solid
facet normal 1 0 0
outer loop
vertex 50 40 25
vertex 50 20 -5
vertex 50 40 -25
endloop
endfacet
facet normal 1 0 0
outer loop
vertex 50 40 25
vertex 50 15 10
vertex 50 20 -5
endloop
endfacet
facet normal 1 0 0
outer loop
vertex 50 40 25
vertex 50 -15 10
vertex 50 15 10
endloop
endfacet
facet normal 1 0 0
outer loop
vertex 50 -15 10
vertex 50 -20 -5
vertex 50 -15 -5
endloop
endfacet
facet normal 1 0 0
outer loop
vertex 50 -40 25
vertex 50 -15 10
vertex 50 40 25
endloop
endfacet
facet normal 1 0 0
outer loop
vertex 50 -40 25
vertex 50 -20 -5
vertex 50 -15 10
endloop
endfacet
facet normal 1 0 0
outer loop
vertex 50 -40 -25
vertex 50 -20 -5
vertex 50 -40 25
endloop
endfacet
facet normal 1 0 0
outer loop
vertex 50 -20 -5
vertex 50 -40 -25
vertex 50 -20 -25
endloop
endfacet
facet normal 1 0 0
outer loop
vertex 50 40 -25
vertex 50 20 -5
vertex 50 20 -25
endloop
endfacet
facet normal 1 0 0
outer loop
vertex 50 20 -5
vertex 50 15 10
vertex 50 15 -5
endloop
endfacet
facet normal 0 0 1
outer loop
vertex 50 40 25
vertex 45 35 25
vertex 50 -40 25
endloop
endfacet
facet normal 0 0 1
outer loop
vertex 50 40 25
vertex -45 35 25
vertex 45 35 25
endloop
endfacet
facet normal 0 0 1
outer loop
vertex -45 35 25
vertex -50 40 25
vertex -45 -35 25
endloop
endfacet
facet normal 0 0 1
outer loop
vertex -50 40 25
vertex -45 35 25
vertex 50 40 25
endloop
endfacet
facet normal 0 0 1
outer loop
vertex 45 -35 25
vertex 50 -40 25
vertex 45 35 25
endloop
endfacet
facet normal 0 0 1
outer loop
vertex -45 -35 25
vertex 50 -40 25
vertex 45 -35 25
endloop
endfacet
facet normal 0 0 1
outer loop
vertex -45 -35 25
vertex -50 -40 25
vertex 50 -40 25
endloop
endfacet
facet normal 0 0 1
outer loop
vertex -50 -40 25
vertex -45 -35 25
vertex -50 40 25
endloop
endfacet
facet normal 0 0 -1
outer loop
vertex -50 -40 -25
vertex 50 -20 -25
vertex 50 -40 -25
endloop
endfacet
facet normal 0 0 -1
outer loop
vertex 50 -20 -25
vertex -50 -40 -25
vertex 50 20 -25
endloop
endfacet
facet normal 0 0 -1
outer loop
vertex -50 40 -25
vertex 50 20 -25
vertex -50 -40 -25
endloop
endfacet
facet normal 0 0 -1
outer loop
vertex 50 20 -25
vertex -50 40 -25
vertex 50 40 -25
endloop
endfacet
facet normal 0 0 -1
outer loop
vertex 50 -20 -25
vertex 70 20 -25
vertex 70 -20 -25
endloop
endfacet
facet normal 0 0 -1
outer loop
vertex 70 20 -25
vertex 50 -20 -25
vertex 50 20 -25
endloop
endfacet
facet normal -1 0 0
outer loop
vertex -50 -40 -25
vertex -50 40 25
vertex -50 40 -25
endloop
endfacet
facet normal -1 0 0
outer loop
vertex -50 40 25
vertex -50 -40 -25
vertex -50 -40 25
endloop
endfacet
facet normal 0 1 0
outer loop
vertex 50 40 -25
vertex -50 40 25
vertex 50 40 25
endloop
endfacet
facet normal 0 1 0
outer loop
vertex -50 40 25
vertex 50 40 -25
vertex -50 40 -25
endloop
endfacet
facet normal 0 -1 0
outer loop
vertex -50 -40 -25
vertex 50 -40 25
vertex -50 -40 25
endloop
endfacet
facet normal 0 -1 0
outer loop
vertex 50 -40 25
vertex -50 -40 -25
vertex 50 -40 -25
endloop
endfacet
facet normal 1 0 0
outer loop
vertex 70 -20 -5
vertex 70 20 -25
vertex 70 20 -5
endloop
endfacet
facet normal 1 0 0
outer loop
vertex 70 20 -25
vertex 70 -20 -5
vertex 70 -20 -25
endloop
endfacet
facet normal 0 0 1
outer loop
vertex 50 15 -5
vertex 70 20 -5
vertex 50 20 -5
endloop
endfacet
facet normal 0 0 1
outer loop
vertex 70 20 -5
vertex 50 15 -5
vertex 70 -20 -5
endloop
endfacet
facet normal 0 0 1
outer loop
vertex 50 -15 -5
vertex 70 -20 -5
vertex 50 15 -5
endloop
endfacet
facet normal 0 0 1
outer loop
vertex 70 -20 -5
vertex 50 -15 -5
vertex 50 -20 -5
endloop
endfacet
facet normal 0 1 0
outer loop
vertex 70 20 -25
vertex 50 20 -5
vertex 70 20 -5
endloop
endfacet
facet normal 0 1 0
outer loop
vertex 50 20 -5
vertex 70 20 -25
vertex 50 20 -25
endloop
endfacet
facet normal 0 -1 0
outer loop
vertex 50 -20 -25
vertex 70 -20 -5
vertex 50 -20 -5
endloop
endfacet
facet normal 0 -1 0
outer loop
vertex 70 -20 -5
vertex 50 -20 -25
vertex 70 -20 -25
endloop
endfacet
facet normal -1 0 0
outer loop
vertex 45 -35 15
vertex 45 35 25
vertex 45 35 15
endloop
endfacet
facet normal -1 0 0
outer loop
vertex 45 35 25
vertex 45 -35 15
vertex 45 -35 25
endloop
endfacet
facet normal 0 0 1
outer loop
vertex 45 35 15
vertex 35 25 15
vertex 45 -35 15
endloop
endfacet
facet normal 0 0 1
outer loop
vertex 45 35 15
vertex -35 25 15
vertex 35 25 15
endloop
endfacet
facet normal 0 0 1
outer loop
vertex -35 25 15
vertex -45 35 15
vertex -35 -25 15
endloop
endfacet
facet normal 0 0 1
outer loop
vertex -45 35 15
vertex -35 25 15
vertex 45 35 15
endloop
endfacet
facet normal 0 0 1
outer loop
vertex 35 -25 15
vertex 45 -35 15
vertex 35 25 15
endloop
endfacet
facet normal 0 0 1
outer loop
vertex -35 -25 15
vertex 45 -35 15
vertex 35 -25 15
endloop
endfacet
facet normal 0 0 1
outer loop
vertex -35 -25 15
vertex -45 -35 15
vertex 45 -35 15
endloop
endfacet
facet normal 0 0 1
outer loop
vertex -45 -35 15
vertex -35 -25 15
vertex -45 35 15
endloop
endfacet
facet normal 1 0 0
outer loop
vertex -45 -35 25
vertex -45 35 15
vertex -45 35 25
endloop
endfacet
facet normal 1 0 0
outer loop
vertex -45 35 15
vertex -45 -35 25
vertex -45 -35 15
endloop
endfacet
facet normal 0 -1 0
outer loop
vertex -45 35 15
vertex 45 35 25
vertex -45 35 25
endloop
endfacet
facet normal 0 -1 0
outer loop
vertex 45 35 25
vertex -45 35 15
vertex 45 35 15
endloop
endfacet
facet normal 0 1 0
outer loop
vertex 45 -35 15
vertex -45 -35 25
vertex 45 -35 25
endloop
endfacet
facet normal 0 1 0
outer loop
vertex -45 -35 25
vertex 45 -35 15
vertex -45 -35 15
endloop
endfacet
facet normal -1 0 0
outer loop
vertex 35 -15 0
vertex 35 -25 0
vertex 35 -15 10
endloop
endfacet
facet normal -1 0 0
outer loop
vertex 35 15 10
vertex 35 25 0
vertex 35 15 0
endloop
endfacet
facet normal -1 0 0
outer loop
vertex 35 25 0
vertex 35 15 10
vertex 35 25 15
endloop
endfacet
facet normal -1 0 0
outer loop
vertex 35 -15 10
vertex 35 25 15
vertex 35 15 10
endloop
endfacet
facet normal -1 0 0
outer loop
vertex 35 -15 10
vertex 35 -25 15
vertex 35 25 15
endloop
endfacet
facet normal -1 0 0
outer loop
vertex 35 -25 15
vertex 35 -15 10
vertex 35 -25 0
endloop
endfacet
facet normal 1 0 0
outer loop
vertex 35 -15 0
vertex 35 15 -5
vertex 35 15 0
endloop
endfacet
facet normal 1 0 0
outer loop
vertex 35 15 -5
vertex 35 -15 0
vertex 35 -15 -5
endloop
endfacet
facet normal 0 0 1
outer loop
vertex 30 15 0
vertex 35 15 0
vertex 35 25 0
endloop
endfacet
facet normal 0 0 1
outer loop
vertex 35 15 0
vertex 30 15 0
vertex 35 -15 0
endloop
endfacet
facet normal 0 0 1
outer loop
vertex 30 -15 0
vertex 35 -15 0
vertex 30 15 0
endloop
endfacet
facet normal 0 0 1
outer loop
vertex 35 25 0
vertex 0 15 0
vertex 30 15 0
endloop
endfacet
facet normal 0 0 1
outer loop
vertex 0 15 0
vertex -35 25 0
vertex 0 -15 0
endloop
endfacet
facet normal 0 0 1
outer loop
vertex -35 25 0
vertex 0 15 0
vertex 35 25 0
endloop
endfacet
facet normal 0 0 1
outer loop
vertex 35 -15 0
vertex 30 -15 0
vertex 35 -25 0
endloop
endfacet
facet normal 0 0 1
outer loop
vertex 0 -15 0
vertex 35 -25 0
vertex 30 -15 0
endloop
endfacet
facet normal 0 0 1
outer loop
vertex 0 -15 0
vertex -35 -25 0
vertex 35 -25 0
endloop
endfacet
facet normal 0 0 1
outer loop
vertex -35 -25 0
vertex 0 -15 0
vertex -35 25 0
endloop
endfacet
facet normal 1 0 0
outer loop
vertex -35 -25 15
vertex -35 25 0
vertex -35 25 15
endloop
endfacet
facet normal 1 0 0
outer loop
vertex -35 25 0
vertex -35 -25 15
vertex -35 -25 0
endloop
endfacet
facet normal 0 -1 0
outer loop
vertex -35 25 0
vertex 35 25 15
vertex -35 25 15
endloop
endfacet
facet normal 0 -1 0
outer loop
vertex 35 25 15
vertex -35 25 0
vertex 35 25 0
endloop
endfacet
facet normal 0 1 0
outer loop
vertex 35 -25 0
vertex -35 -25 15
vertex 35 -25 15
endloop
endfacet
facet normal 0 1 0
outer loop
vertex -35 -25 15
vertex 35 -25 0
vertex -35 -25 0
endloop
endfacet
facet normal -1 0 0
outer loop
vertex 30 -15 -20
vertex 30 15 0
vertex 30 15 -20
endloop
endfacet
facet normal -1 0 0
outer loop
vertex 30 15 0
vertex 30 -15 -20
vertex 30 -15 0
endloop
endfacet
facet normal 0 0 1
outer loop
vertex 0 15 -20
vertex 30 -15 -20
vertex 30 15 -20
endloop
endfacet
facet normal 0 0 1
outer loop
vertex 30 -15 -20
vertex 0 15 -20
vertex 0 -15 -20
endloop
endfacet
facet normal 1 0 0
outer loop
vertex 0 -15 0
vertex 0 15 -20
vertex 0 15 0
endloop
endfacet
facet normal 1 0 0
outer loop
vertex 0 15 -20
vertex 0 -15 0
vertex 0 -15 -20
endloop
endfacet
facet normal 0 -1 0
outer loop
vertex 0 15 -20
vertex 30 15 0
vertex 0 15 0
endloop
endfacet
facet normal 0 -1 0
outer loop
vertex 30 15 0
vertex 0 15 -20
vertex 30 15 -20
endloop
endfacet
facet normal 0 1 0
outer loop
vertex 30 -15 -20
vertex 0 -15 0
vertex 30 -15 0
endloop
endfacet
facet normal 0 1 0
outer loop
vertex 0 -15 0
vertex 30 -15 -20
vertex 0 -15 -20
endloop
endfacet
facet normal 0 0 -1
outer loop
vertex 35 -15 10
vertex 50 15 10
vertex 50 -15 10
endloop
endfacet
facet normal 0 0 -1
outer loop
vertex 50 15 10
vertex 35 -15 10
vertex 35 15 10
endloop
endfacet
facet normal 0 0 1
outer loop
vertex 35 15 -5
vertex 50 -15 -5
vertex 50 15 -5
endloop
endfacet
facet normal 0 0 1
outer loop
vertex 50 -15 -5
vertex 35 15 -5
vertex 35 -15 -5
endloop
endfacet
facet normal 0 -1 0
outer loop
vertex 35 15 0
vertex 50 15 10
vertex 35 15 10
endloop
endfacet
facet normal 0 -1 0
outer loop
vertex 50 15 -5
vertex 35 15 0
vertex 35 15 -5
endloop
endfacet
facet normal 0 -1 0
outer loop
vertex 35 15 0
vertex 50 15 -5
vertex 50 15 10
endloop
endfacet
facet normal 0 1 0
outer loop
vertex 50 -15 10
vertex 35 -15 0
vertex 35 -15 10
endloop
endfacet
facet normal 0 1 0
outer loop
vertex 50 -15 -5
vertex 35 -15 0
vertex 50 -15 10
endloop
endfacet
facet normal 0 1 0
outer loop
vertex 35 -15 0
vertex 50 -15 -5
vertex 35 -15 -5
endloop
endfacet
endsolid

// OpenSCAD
// Parameters (all dimensions in mm)
$fn = 50; // resolution for curved surfaces (not needed here, but good practice)

// Main body dimensions
body_length = 100;
body_width  = 80;
body_height = 50;

// Top recess (shallow, surrounded by thin rim)
rim_thickness = 5;
top_recess_depth = 10;

// Second recess (deeper, inset from top recess)
recess2_length = 70;
recess2_width  = 50;
recess2_depth  = 25;  // total depth from top surface

// Deepest pocket (shifted to one side, uneven ledges)
deepest_length   = 30;
deepest_width    = 30;
deepest_depth    = 45;  // total depth from top surface, leaves solid bottom
deepest_offset_x = 15;  // shift along X relative to center (positive = right side)

// Side projection (added rectangular solid along one side)
projection_length = 20;  // how far it sticks out
projection_width  = 40;
projection_height = 20;  // from bottom upward

// Side recess above the projection (creates stepped depth tier)
side_recess_width   = 30;
side_recess_height  = 15;  // vertical size of the recess
side_recess_depth   = 15;  // how deep it cuts into the main body
side_recess_z_start = projection_height;  // starts at the top of the projection

// Build the main solid: main body + side projection
difference() {
    union() {
        // Main rectangular body (centered at origin)
        cube([body_length, body_width, body_height], center = true);
        
        // Side projection attached to the right side (positive X), bottom-aligned
        translate([
            body_length / 2 + projection_length / 2,  // right face of body + half projection thickness
            0,                                        // centered in Y
            -body_height / 2 + projection_height / 2  // bottom of body + half projection height
        ])
            cube([projection_length, projection_width, projection_height], center = true);
    }
    
    // --- Interior stepped cavity from top ---
    
    // 1. Top recess (broad, shallow, surrounded by rim)
    translate([0, 0, body_height / 2 - top_recess_depth / 2])
        cube([
            body_length - 2 * rim_thickness,
            body_width  - 2 * rim_thickness,
            top_recess_depth
        ], center = true);
    
    // 2. Second recess (smaller, deeper, centered)
    translate([0, 0, body_height / 2 - recess2_depth / 2])
        cube([recess2_length, recess2_width, recess2_depth], center = true);
    
    // 3. Deepest pocket (smallest, deepest, shifted to one side)
    translate([deepest_offset_x, 0, body_height / 2 - deepest_depth / 2])
        cube([deepest_length, deepest_width, deepest_depth], center = true);
    
    // --- Side recess above the projection (stepped tier on the right side) ---
    translate([
        body_length / 2 - side_recess_depth / 2,   // start at right face, go inward
        0,                                         // centered in Y
        -body_height / 2 + side_recess_z_start + side_recess_height / 2  // above projection
    ])
        cube([side_recess_depth, side_recess_width, side_recess_height], center = true);
}
